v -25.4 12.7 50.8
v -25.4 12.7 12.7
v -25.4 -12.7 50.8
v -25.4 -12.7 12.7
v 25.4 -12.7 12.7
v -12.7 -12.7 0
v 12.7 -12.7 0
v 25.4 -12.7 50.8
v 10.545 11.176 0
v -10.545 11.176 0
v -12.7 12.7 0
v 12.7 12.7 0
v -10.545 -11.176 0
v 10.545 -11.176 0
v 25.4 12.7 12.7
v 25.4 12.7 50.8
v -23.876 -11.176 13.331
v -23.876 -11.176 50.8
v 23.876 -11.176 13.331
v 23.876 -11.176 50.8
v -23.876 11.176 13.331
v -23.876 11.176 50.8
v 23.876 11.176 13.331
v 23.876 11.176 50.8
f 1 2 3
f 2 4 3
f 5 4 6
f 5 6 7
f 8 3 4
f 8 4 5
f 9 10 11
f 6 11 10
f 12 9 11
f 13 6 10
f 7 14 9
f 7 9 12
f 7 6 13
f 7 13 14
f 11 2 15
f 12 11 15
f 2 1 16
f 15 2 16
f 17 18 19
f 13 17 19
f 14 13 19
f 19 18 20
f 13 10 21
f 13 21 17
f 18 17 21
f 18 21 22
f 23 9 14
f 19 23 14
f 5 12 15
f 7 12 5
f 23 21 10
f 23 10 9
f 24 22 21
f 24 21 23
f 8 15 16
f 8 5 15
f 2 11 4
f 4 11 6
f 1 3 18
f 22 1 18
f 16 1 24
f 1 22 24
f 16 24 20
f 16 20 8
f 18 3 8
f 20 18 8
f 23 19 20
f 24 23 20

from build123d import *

# Parameters (mm, degrees)
F0_W     = 50.8
F0_H     = 50.8
F1_DEPTH = 12.7
F2_SIZE  = 12.7
F3_T     = -1.524


with BuildPart() as f1:
    # F0 (on Front) → F1 (new body, symmetric)
    with BuildSketch(Plane.XZ):
        with Locations((0, 25.4)):
            Rectangle(F0_W, F0_H)
    extrude(amount=F1_DEPTH, both=True)

    # F2
    f2_edges = [f1.edges().sort_by_distance(p)[0] for p in [
        (-25.4, 0, 0),
        (25.4, 0, 0),
    ]]
    chamfer(f2_edges, length=F2_SIZE)

    # F3
    f3_openings = [f1.faces().sort_by_distance(p)[0] for p in [
        (0, 0, 50.8),
        (0, 0, 0),
    ]]
    offset(amount=F3_T, openings=f3_openings)


solid = f1.part
